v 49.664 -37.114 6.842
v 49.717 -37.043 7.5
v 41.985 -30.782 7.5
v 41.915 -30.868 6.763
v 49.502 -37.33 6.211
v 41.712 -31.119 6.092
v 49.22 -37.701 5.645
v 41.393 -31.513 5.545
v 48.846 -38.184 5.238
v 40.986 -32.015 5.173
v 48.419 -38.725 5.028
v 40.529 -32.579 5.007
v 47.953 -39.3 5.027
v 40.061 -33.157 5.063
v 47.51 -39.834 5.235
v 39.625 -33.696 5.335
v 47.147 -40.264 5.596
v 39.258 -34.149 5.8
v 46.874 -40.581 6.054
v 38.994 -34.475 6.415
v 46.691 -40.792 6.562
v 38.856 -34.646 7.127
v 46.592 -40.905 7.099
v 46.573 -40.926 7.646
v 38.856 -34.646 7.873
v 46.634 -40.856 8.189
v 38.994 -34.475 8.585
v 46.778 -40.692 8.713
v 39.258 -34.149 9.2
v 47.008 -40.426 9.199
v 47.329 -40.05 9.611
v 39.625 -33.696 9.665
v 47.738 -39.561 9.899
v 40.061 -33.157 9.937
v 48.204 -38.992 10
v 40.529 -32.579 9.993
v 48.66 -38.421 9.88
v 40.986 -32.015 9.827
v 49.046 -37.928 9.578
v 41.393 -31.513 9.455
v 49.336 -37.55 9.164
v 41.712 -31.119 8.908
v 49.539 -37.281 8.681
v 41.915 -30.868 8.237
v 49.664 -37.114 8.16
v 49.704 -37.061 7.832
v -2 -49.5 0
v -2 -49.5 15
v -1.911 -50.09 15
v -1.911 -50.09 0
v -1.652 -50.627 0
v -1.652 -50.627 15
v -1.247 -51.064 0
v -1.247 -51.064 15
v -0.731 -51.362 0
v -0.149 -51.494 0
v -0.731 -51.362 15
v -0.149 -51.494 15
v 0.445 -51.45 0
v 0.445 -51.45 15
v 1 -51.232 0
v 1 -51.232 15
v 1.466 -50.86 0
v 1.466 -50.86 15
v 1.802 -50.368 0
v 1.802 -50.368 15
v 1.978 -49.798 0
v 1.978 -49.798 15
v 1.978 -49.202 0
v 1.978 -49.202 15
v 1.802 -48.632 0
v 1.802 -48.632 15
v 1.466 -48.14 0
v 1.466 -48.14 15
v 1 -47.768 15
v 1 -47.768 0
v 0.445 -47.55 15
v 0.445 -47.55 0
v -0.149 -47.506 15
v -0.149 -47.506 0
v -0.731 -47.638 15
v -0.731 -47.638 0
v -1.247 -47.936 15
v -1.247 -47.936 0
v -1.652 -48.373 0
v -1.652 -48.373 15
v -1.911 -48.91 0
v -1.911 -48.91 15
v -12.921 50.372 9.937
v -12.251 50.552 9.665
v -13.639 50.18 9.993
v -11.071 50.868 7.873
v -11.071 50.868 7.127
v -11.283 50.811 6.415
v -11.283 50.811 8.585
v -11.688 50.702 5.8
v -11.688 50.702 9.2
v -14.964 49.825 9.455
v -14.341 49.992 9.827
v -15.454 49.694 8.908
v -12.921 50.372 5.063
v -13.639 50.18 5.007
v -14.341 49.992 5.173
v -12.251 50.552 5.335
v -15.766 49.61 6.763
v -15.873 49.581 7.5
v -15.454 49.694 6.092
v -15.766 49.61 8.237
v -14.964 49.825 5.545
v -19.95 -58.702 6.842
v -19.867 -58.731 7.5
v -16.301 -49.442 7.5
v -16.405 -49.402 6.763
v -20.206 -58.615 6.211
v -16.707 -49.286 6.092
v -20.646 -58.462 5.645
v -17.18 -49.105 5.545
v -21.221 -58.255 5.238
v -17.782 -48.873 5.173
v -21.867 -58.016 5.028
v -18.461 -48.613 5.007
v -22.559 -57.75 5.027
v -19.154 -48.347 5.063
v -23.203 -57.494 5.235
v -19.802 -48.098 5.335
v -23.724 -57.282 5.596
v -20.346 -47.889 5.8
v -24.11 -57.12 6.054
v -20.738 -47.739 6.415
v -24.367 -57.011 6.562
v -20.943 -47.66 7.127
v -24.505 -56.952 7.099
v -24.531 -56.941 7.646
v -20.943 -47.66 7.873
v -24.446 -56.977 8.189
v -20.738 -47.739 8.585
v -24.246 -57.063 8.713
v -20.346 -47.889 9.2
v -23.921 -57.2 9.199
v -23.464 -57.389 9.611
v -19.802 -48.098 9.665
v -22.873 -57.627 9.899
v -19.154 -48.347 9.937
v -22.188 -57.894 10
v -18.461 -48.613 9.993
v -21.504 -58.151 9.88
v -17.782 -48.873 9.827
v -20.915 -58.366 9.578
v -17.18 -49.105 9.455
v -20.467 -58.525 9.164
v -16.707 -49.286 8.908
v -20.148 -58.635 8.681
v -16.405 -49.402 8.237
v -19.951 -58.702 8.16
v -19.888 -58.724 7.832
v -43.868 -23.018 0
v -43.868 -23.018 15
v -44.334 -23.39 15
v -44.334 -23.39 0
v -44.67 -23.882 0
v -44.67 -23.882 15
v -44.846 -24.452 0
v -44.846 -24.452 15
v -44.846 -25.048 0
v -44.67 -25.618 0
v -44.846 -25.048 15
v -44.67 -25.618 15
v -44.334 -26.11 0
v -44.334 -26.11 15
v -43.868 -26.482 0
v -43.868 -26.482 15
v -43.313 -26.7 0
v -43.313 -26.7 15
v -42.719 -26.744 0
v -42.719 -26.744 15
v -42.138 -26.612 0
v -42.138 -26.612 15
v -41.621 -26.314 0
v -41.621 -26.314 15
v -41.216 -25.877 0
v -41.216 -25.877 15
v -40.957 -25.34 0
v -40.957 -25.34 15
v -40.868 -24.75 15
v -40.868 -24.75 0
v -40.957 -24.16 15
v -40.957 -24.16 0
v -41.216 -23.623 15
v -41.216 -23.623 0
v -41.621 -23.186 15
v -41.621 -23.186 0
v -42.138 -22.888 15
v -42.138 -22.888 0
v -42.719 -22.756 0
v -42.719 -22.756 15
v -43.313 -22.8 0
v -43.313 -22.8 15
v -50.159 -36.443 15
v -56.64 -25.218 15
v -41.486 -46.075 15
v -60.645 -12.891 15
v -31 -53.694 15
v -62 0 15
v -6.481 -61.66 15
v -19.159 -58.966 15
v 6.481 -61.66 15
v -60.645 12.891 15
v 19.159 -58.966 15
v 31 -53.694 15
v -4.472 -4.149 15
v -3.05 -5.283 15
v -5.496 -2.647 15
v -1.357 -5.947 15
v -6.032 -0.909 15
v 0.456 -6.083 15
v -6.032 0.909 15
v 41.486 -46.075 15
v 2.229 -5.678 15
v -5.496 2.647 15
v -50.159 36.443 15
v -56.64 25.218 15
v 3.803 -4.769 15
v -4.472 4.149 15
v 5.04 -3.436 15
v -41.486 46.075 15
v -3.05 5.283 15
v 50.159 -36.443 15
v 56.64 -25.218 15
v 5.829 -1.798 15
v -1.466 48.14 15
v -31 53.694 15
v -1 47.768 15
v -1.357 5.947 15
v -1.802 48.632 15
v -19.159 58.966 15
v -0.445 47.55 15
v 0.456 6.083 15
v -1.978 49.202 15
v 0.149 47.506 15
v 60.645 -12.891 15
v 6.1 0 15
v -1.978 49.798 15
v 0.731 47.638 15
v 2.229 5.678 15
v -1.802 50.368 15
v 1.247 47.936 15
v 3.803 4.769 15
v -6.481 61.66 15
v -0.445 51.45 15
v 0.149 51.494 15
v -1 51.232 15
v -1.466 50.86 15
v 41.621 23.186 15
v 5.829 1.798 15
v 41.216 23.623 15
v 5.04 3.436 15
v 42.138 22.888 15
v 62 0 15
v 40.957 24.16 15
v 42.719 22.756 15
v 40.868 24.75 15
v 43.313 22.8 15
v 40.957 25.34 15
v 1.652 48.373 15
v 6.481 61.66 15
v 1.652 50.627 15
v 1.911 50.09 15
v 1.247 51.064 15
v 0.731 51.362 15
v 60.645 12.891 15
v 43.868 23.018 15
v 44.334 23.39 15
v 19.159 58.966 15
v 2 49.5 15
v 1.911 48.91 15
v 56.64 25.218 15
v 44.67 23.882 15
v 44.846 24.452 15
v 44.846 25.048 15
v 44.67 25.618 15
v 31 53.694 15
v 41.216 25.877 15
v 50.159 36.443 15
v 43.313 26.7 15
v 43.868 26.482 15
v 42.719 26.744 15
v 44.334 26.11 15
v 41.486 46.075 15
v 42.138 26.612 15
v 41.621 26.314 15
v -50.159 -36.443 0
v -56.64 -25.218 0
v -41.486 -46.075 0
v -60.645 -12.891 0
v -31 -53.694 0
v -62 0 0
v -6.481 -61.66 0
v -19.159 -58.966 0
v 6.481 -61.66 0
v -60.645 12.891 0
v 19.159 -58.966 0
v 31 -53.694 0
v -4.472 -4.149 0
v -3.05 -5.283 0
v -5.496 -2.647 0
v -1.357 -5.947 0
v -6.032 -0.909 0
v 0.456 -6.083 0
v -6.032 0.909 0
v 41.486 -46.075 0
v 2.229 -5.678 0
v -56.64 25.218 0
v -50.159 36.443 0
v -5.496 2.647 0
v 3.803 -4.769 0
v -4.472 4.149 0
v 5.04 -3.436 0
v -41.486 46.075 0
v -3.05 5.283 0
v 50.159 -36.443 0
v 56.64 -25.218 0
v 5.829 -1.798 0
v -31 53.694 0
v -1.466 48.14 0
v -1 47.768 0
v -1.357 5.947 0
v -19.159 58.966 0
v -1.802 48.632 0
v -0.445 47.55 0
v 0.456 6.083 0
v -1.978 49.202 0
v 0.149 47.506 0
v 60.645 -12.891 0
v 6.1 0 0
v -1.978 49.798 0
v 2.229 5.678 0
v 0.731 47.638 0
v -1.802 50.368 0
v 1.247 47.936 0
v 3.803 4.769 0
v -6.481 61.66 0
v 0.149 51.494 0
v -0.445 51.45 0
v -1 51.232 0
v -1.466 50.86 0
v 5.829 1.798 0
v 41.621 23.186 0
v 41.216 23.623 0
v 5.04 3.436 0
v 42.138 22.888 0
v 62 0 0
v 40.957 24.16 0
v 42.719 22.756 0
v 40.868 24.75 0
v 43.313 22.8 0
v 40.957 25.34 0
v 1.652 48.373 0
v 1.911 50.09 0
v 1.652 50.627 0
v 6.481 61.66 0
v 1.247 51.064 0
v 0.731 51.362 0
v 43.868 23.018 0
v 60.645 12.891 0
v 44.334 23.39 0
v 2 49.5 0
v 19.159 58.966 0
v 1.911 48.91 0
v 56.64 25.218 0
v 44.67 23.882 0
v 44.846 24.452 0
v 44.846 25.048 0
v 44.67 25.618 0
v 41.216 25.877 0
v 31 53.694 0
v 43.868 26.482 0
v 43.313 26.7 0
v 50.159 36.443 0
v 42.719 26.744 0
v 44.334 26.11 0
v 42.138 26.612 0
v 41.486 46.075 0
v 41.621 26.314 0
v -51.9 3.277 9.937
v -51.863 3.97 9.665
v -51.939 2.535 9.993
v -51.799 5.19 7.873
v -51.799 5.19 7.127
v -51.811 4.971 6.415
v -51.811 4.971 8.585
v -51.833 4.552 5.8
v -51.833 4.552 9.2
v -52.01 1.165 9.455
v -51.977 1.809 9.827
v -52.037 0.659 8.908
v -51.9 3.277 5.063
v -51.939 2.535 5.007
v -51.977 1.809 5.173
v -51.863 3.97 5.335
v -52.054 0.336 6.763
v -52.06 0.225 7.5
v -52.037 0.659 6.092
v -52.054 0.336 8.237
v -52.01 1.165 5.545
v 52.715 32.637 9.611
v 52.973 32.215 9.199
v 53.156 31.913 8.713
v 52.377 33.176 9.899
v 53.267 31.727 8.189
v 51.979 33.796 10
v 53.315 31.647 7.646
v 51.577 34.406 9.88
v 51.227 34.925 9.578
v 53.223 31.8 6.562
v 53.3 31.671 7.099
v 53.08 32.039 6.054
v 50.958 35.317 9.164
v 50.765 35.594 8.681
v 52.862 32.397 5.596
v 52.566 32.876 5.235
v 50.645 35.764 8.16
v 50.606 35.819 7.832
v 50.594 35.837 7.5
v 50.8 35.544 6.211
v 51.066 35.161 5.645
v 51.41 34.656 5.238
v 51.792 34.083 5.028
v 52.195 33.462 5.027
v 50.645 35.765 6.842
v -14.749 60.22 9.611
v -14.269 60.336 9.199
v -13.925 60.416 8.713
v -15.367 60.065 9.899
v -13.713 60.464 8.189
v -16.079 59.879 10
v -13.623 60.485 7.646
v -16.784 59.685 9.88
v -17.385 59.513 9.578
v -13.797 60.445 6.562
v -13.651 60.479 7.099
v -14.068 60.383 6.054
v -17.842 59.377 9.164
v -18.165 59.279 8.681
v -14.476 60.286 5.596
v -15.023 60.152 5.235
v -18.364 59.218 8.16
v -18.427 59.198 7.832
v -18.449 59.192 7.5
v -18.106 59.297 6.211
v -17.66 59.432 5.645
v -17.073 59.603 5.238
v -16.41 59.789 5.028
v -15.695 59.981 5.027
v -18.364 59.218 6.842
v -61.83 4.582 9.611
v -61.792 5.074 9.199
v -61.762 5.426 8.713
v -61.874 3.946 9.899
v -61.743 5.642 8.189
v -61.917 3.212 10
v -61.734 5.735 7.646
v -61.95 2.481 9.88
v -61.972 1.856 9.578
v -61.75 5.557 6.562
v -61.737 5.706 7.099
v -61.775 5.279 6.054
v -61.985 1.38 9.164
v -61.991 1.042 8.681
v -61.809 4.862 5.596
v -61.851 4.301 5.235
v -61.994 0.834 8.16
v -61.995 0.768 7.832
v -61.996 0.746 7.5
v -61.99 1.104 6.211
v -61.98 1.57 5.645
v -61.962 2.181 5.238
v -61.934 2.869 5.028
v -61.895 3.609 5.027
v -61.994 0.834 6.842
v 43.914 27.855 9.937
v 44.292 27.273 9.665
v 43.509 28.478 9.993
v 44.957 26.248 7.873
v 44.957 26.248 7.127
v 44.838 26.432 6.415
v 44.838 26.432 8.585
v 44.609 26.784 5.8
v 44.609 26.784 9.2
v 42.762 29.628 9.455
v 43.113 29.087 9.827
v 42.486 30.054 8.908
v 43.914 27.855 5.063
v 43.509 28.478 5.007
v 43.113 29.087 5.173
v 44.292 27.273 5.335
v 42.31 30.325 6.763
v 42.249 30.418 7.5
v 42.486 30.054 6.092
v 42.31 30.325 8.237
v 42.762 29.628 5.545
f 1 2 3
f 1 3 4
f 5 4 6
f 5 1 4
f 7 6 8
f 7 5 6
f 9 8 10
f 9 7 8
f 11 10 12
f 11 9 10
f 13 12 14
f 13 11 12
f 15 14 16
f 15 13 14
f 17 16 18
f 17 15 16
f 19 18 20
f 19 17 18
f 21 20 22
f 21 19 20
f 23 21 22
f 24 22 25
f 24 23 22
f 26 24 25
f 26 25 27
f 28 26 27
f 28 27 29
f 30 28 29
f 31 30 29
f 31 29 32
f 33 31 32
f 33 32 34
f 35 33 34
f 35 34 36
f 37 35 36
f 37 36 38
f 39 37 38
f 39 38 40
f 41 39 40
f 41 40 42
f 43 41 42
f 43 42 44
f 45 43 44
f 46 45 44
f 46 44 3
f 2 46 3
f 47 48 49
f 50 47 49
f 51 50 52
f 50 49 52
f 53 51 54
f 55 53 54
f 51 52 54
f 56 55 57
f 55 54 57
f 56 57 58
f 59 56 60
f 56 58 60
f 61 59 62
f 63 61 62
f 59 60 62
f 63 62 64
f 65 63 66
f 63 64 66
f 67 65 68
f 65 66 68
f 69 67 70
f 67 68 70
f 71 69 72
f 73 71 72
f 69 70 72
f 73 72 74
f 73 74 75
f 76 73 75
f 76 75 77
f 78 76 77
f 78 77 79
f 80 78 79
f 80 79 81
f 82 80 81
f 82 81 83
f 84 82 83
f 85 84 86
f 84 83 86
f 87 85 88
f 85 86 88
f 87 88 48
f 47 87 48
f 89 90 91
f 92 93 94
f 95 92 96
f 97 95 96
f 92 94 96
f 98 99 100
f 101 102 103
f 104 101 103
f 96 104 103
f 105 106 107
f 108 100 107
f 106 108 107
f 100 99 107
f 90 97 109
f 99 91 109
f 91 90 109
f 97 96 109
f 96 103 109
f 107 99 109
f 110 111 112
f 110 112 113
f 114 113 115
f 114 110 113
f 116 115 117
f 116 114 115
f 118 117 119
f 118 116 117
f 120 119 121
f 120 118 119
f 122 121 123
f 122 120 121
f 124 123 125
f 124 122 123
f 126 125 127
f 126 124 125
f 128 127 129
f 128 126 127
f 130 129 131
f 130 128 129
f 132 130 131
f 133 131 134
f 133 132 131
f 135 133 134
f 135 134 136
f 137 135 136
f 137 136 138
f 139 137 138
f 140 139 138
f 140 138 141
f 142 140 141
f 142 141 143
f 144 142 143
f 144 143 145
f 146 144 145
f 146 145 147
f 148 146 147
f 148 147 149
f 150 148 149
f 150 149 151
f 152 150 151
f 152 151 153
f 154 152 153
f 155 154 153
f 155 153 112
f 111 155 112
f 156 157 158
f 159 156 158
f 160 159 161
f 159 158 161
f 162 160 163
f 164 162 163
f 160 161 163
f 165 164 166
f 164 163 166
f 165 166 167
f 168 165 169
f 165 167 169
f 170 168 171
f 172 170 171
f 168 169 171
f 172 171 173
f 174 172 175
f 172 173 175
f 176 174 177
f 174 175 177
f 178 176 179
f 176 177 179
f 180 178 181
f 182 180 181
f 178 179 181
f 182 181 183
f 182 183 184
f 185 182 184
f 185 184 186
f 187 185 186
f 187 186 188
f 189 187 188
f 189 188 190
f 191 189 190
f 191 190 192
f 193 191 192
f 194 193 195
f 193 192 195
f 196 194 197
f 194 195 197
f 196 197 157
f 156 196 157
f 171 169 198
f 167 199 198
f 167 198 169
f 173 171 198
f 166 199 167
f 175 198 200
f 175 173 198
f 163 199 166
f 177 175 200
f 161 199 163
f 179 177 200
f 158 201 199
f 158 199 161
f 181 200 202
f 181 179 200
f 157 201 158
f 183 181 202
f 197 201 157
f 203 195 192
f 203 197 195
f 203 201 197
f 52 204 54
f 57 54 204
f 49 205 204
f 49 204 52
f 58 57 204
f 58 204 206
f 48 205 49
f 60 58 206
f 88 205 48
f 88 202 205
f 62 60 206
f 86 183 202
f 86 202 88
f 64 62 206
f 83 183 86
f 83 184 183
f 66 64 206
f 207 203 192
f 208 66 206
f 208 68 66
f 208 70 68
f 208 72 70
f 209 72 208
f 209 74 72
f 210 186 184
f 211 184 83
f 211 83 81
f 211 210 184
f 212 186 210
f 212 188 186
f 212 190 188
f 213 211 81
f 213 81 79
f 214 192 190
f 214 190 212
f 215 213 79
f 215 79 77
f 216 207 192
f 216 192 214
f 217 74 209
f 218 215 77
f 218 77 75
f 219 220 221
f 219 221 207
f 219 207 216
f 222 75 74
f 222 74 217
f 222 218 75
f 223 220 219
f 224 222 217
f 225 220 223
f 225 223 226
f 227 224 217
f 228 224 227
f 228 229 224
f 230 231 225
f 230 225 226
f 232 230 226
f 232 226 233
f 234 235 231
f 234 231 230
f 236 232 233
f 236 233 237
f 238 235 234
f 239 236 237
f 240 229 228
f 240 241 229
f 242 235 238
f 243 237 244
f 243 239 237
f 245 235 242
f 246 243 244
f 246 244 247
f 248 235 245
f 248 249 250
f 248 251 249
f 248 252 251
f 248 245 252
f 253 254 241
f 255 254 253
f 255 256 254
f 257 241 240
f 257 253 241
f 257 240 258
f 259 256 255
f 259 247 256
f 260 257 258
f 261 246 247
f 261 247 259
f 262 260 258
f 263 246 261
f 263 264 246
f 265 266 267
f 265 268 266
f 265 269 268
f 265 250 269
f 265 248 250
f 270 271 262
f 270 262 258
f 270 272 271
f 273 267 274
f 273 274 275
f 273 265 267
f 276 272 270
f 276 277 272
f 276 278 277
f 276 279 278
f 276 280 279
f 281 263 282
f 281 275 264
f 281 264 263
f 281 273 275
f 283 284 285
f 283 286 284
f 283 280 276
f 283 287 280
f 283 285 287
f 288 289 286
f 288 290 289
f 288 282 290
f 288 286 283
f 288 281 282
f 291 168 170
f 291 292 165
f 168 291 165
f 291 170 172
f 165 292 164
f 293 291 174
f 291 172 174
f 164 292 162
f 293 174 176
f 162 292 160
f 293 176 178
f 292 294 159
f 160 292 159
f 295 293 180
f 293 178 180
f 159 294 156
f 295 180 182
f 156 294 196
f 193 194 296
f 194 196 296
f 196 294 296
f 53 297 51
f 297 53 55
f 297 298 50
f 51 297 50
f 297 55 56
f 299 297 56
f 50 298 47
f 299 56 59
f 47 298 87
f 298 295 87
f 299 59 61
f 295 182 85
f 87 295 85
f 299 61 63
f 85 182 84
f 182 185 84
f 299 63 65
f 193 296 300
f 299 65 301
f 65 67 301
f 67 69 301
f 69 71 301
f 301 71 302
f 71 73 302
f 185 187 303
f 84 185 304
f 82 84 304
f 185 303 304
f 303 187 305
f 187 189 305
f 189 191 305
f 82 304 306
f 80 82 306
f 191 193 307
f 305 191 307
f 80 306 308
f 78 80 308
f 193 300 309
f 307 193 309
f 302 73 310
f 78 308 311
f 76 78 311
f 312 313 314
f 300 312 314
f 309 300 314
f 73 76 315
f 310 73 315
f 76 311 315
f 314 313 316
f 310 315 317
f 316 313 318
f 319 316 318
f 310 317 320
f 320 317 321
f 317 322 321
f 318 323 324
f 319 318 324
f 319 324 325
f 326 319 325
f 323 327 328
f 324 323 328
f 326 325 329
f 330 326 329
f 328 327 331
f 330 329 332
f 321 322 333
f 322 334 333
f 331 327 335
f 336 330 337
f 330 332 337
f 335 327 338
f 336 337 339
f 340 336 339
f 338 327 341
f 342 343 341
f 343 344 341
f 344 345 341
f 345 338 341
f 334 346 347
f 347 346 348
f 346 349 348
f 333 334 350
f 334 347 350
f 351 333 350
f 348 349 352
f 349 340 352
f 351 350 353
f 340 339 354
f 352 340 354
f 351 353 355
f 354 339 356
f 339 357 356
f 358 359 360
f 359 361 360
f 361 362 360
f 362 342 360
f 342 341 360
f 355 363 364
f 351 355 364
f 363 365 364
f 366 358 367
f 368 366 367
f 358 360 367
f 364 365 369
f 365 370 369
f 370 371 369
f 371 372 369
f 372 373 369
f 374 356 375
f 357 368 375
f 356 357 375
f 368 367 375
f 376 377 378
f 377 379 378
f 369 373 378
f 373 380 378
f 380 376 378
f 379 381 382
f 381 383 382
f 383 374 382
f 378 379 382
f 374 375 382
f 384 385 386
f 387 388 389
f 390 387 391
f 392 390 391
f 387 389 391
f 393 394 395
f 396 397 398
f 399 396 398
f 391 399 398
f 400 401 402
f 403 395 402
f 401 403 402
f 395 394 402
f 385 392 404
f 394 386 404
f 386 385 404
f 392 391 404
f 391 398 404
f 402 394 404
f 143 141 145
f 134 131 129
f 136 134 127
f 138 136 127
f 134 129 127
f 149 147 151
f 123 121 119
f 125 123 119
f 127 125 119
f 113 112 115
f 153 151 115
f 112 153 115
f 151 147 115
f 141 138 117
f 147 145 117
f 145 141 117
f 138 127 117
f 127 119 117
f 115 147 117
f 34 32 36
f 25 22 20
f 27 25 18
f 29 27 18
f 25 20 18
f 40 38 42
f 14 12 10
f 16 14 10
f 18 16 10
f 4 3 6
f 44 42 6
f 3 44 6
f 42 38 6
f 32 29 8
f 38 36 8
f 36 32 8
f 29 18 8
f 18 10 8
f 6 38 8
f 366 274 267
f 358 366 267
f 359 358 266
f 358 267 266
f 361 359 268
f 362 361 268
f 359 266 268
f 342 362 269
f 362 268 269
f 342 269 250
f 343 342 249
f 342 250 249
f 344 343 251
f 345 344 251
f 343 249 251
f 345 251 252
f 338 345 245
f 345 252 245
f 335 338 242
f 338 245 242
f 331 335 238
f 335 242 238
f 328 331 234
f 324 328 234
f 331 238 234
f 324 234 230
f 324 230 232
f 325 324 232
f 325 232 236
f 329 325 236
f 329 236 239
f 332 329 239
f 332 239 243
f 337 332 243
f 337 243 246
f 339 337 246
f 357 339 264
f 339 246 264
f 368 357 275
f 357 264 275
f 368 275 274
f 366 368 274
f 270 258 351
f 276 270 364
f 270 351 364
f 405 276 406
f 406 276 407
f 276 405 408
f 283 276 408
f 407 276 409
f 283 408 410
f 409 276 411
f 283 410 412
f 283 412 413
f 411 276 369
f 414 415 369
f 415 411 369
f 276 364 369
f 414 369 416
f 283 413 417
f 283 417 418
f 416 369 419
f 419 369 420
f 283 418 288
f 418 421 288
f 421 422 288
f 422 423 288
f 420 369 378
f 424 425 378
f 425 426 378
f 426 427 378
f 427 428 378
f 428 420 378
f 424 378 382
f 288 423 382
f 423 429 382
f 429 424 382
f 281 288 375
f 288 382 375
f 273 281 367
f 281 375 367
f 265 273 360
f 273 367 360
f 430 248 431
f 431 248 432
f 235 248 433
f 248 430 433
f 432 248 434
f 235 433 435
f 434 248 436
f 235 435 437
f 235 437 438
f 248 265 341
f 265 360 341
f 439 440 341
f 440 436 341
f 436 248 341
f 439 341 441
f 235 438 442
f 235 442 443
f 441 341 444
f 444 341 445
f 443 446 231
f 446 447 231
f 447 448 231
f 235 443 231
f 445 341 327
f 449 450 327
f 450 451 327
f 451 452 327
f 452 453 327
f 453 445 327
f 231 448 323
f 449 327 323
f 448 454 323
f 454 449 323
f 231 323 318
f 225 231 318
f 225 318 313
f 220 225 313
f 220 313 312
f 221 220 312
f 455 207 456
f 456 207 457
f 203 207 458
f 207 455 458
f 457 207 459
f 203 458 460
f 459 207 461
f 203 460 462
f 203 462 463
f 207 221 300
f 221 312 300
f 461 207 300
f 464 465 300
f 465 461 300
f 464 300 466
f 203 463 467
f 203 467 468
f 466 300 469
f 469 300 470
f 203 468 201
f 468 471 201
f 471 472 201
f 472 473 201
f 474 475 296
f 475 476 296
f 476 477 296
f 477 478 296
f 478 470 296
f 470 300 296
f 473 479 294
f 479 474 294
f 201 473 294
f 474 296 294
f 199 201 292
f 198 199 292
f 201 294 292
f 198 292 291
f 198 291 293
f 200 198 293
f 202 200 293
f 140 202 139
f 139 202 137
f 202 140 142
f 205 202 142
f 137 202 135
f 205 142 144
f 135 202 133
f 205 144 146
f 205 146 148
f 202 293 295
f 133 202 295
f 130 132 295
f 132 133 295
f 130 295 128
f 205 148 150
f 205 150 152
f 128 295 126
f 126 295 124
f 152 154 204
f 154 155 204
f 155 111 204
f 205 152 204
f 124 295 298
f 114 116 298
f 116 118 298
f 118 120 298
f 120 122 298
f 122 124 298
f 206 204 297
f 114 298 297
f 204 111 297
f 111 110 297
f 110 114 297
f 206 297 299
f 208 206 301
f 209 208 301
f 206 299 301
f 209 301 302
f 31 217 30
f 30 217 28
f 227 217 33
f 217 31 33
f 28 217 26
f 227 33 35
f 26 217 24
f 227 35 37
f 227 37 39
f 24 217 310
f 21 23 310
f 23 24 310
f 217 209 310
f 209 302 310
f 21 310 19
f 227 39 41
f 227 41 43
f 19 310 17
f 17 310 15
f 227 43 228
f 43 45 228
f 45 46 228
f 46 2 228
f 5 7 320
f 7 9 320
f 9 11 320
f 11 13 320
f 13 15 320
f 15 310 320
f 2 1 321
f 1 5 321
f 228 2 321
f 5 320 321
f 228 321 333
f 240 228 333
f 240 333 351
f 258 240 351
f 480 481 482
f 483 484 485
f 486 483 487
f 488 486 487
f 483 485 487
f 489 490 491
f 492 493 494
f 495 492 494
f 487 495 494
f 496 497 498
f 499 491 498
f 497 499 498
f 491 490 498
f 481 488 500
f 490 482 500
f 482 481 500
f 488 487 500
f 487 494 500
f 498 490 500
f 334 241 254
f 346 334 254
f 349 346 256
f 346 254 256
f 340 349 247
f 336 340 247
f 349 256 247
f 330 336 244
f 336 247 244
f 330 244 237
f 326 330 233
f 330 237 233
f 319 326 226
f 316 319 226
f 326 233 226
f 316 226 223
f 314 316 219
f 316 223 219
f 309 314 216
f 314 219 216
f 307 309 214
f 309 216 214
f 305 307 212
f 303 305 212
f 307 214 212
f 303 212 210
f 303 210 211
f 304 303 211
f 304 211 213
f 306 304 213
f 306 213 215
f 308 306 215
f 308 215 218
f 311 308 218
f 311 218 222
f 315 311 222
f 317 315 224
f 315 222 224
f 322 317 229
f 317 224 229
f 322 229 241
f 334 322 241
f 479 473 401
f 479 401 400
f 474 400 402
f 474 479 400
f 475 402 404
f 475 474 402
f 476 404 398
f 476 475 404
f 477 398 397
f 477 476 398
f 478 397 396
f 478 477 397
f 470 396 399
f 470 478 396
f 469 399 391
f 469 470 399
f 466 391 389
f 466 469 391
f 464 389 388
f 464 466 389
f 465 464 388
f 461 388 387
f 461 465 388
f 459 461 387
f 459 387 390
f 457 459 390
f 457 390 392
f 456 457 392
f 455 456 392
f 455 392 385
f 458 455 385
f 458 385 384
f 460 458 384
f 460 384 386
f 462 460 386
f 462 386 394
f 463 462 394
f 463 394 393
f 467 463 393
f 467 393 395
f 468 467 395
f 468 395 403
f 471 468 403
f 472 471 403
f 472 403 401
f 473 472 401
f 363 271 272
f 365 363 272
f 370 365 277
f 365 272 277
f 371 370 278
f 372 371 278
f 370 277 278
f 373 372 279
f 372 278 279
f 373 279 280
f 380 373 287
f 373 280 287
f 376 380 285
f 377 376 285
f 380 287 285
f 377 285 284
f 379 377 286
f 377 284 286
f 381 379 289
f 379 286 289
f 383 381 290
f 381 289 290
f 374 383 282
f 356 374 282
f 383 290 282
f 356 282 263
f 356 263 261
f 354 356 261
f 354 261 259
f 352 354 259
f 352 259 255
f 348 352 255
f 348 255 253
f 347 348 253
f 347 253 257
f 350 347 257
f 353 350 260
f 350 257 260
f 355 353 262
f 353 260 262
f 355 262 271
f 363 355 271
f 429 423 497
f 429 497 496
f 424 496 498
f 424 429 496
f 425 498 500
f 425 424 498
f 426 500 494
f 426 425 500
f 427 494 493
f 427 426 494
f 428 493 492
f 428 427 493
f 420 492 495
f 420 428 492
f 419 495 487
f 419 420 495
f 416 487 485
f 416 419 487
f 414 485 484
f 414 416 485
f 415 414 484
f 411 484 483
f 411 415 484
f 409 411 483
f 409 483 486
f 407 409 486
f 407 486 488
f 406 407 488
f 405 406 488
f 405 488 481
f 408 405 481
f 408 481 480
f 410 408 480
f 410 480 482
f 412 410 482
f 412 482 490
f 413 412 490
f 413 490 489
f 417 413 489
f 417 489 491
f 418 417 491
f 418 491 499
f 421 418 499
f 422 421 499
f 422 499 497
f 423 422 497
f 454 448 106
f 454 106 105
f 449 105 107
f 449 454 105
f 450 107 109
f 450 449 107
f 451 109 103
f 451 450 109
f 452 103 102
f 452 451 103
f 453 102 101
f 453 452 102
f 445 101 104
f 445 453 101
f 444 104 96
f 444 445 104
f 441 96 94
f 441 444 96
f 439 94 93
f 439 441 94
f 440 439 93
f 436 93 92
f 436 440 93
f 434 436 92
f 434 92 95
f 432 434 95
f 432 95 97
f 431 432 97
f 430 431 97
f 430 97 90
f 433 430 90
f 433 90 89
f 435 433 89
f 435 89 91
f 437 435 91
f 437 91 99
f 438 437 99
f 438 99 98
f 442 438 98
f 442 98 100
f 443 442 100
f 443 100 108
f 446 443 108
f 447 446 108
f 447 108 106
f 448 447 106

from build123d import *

# Parameters (mm, degrees)
SKETCH1_R                   = 62
BOSS_EXTRUDE1_DEPTH         = 15
SKETCH2_R                   = 2
CUT_EXTRUDE1_DEPTH          = 15
CIRPATTERN1_COUNT           = 2
CIRPATTERN1_ANGLE           = 60
CIRPATTERN2_COUNT           = 2
CIRPATTERN2_COPY_1_SKETCH_R = 2
CIRPATTERN2_COPY_1_DEPTH    = 15
SKETCH3_R                   = 6.1
CUT_EXTRUDE2_DEPTH          = 15
SKETCH4_R                   = 2.5
CUT_EXTRUDE4_DEPTH          = 10
CIRPATTERN5_COUNT           = 5


with BuildPart() as part:
    # Sketch1 → Boss-Extrude1 (new body)
    with BuildSketch(Plane.XY):
        Circle(SKETCH1_R)
    extrude(amount=BOSS_EXTRUDE1_DEPTH)

    # Sketch2 → Cut-Extrude1 (cut)
    with BuildSketch(Plane.XY.offset(15)):
        with Locations((0, 49.5)):
            Circle(SKETCH2_R)
    cut_extrude1 = extrude(amount=-CUT_EXTRUDE1_DEPTH, mode=Mode.SUBTRACT)

    # CirPattern1: Cut-Extrude1 ×2 about axis
    cirpattern1_axis = Axis((0, 0, 15), (0, 0, -1))
    for i in range(1, CIRPATTERN1_COUNT):
        add(cut_extrude1.rotate(cirpattern1_axis, i * CIRPATTERN1_ANGLE / (CIRPATTERN1_COUNT - 1)), mode=Mode.SUBTRACT)

    # CirPattern2: Cut-Extrude1 ×2 about axis
    cirpattern2_axis = Axis((0, 0, 15), (0, 0, -1))
    for i in range(1, CIRPATTERN2_COUNT):
        add(cut_extrude1.rotate(cirpattern2_axis, i * 360 / CIRPATTERN2_COUNT), mode=Mode.SUBTRACT)

    # CirPattern2 copy 1 sketch → CirPattern2 copy 1 (cut)
    with BuildSketch(Plane(origin=(0, 0, 15), x_dir=(-0.4999999999999979, 0.8660254037844398, 0), z_dir=(0, 0, 1))):
        with Locations((0, 49.5)):
            Circle(CIRPATTERN2_COPY_1_SKETCH_R)
    extrude(amount=-CIRPATTERN2_COPY_1_DEPTH, mode=Mode.SUBTRACT)

    # Sketch3 → Cut-Extrude2 (cut)
    with BuildSketch(Plane.XY.offset(15)):
        Circle(SKETCH3_R)
    extrude(amount=-CUT_EXTRUDE2_DEPTH, mode=Mode.SUBTRACT)

    # Sketch4 → Cut-Extrude4 (cut)
    with BuildSketch(Plane(origin=(51.997575213, 33.767620171, 0), x_dir=(0, 0, -1), z_dir=(-0.8386705679454236, -0.544639035015028, 0))):
        with Locations((-7.5, 0)):
            Circle(SKETCH4_R)
    cut_extrude4 = extrude(amount=CUT_EXTRUDE4_DEPTH, mode=Mode.SUBTRACT)

    # CirPattern5: Cut-Extrude4 ×5 about axis
    cirpattern5_axis = Axis((0, 0, 0), (0, 0, 1))
    for i in range(1, CIRPATTERN5_COUNT):
        add(cut_extrude4.rotate(cirpattern5_axis, i * 360 / CIRPATTERN5_COUNT), mode=Mode.SUBTRACT)


solid = part.part
